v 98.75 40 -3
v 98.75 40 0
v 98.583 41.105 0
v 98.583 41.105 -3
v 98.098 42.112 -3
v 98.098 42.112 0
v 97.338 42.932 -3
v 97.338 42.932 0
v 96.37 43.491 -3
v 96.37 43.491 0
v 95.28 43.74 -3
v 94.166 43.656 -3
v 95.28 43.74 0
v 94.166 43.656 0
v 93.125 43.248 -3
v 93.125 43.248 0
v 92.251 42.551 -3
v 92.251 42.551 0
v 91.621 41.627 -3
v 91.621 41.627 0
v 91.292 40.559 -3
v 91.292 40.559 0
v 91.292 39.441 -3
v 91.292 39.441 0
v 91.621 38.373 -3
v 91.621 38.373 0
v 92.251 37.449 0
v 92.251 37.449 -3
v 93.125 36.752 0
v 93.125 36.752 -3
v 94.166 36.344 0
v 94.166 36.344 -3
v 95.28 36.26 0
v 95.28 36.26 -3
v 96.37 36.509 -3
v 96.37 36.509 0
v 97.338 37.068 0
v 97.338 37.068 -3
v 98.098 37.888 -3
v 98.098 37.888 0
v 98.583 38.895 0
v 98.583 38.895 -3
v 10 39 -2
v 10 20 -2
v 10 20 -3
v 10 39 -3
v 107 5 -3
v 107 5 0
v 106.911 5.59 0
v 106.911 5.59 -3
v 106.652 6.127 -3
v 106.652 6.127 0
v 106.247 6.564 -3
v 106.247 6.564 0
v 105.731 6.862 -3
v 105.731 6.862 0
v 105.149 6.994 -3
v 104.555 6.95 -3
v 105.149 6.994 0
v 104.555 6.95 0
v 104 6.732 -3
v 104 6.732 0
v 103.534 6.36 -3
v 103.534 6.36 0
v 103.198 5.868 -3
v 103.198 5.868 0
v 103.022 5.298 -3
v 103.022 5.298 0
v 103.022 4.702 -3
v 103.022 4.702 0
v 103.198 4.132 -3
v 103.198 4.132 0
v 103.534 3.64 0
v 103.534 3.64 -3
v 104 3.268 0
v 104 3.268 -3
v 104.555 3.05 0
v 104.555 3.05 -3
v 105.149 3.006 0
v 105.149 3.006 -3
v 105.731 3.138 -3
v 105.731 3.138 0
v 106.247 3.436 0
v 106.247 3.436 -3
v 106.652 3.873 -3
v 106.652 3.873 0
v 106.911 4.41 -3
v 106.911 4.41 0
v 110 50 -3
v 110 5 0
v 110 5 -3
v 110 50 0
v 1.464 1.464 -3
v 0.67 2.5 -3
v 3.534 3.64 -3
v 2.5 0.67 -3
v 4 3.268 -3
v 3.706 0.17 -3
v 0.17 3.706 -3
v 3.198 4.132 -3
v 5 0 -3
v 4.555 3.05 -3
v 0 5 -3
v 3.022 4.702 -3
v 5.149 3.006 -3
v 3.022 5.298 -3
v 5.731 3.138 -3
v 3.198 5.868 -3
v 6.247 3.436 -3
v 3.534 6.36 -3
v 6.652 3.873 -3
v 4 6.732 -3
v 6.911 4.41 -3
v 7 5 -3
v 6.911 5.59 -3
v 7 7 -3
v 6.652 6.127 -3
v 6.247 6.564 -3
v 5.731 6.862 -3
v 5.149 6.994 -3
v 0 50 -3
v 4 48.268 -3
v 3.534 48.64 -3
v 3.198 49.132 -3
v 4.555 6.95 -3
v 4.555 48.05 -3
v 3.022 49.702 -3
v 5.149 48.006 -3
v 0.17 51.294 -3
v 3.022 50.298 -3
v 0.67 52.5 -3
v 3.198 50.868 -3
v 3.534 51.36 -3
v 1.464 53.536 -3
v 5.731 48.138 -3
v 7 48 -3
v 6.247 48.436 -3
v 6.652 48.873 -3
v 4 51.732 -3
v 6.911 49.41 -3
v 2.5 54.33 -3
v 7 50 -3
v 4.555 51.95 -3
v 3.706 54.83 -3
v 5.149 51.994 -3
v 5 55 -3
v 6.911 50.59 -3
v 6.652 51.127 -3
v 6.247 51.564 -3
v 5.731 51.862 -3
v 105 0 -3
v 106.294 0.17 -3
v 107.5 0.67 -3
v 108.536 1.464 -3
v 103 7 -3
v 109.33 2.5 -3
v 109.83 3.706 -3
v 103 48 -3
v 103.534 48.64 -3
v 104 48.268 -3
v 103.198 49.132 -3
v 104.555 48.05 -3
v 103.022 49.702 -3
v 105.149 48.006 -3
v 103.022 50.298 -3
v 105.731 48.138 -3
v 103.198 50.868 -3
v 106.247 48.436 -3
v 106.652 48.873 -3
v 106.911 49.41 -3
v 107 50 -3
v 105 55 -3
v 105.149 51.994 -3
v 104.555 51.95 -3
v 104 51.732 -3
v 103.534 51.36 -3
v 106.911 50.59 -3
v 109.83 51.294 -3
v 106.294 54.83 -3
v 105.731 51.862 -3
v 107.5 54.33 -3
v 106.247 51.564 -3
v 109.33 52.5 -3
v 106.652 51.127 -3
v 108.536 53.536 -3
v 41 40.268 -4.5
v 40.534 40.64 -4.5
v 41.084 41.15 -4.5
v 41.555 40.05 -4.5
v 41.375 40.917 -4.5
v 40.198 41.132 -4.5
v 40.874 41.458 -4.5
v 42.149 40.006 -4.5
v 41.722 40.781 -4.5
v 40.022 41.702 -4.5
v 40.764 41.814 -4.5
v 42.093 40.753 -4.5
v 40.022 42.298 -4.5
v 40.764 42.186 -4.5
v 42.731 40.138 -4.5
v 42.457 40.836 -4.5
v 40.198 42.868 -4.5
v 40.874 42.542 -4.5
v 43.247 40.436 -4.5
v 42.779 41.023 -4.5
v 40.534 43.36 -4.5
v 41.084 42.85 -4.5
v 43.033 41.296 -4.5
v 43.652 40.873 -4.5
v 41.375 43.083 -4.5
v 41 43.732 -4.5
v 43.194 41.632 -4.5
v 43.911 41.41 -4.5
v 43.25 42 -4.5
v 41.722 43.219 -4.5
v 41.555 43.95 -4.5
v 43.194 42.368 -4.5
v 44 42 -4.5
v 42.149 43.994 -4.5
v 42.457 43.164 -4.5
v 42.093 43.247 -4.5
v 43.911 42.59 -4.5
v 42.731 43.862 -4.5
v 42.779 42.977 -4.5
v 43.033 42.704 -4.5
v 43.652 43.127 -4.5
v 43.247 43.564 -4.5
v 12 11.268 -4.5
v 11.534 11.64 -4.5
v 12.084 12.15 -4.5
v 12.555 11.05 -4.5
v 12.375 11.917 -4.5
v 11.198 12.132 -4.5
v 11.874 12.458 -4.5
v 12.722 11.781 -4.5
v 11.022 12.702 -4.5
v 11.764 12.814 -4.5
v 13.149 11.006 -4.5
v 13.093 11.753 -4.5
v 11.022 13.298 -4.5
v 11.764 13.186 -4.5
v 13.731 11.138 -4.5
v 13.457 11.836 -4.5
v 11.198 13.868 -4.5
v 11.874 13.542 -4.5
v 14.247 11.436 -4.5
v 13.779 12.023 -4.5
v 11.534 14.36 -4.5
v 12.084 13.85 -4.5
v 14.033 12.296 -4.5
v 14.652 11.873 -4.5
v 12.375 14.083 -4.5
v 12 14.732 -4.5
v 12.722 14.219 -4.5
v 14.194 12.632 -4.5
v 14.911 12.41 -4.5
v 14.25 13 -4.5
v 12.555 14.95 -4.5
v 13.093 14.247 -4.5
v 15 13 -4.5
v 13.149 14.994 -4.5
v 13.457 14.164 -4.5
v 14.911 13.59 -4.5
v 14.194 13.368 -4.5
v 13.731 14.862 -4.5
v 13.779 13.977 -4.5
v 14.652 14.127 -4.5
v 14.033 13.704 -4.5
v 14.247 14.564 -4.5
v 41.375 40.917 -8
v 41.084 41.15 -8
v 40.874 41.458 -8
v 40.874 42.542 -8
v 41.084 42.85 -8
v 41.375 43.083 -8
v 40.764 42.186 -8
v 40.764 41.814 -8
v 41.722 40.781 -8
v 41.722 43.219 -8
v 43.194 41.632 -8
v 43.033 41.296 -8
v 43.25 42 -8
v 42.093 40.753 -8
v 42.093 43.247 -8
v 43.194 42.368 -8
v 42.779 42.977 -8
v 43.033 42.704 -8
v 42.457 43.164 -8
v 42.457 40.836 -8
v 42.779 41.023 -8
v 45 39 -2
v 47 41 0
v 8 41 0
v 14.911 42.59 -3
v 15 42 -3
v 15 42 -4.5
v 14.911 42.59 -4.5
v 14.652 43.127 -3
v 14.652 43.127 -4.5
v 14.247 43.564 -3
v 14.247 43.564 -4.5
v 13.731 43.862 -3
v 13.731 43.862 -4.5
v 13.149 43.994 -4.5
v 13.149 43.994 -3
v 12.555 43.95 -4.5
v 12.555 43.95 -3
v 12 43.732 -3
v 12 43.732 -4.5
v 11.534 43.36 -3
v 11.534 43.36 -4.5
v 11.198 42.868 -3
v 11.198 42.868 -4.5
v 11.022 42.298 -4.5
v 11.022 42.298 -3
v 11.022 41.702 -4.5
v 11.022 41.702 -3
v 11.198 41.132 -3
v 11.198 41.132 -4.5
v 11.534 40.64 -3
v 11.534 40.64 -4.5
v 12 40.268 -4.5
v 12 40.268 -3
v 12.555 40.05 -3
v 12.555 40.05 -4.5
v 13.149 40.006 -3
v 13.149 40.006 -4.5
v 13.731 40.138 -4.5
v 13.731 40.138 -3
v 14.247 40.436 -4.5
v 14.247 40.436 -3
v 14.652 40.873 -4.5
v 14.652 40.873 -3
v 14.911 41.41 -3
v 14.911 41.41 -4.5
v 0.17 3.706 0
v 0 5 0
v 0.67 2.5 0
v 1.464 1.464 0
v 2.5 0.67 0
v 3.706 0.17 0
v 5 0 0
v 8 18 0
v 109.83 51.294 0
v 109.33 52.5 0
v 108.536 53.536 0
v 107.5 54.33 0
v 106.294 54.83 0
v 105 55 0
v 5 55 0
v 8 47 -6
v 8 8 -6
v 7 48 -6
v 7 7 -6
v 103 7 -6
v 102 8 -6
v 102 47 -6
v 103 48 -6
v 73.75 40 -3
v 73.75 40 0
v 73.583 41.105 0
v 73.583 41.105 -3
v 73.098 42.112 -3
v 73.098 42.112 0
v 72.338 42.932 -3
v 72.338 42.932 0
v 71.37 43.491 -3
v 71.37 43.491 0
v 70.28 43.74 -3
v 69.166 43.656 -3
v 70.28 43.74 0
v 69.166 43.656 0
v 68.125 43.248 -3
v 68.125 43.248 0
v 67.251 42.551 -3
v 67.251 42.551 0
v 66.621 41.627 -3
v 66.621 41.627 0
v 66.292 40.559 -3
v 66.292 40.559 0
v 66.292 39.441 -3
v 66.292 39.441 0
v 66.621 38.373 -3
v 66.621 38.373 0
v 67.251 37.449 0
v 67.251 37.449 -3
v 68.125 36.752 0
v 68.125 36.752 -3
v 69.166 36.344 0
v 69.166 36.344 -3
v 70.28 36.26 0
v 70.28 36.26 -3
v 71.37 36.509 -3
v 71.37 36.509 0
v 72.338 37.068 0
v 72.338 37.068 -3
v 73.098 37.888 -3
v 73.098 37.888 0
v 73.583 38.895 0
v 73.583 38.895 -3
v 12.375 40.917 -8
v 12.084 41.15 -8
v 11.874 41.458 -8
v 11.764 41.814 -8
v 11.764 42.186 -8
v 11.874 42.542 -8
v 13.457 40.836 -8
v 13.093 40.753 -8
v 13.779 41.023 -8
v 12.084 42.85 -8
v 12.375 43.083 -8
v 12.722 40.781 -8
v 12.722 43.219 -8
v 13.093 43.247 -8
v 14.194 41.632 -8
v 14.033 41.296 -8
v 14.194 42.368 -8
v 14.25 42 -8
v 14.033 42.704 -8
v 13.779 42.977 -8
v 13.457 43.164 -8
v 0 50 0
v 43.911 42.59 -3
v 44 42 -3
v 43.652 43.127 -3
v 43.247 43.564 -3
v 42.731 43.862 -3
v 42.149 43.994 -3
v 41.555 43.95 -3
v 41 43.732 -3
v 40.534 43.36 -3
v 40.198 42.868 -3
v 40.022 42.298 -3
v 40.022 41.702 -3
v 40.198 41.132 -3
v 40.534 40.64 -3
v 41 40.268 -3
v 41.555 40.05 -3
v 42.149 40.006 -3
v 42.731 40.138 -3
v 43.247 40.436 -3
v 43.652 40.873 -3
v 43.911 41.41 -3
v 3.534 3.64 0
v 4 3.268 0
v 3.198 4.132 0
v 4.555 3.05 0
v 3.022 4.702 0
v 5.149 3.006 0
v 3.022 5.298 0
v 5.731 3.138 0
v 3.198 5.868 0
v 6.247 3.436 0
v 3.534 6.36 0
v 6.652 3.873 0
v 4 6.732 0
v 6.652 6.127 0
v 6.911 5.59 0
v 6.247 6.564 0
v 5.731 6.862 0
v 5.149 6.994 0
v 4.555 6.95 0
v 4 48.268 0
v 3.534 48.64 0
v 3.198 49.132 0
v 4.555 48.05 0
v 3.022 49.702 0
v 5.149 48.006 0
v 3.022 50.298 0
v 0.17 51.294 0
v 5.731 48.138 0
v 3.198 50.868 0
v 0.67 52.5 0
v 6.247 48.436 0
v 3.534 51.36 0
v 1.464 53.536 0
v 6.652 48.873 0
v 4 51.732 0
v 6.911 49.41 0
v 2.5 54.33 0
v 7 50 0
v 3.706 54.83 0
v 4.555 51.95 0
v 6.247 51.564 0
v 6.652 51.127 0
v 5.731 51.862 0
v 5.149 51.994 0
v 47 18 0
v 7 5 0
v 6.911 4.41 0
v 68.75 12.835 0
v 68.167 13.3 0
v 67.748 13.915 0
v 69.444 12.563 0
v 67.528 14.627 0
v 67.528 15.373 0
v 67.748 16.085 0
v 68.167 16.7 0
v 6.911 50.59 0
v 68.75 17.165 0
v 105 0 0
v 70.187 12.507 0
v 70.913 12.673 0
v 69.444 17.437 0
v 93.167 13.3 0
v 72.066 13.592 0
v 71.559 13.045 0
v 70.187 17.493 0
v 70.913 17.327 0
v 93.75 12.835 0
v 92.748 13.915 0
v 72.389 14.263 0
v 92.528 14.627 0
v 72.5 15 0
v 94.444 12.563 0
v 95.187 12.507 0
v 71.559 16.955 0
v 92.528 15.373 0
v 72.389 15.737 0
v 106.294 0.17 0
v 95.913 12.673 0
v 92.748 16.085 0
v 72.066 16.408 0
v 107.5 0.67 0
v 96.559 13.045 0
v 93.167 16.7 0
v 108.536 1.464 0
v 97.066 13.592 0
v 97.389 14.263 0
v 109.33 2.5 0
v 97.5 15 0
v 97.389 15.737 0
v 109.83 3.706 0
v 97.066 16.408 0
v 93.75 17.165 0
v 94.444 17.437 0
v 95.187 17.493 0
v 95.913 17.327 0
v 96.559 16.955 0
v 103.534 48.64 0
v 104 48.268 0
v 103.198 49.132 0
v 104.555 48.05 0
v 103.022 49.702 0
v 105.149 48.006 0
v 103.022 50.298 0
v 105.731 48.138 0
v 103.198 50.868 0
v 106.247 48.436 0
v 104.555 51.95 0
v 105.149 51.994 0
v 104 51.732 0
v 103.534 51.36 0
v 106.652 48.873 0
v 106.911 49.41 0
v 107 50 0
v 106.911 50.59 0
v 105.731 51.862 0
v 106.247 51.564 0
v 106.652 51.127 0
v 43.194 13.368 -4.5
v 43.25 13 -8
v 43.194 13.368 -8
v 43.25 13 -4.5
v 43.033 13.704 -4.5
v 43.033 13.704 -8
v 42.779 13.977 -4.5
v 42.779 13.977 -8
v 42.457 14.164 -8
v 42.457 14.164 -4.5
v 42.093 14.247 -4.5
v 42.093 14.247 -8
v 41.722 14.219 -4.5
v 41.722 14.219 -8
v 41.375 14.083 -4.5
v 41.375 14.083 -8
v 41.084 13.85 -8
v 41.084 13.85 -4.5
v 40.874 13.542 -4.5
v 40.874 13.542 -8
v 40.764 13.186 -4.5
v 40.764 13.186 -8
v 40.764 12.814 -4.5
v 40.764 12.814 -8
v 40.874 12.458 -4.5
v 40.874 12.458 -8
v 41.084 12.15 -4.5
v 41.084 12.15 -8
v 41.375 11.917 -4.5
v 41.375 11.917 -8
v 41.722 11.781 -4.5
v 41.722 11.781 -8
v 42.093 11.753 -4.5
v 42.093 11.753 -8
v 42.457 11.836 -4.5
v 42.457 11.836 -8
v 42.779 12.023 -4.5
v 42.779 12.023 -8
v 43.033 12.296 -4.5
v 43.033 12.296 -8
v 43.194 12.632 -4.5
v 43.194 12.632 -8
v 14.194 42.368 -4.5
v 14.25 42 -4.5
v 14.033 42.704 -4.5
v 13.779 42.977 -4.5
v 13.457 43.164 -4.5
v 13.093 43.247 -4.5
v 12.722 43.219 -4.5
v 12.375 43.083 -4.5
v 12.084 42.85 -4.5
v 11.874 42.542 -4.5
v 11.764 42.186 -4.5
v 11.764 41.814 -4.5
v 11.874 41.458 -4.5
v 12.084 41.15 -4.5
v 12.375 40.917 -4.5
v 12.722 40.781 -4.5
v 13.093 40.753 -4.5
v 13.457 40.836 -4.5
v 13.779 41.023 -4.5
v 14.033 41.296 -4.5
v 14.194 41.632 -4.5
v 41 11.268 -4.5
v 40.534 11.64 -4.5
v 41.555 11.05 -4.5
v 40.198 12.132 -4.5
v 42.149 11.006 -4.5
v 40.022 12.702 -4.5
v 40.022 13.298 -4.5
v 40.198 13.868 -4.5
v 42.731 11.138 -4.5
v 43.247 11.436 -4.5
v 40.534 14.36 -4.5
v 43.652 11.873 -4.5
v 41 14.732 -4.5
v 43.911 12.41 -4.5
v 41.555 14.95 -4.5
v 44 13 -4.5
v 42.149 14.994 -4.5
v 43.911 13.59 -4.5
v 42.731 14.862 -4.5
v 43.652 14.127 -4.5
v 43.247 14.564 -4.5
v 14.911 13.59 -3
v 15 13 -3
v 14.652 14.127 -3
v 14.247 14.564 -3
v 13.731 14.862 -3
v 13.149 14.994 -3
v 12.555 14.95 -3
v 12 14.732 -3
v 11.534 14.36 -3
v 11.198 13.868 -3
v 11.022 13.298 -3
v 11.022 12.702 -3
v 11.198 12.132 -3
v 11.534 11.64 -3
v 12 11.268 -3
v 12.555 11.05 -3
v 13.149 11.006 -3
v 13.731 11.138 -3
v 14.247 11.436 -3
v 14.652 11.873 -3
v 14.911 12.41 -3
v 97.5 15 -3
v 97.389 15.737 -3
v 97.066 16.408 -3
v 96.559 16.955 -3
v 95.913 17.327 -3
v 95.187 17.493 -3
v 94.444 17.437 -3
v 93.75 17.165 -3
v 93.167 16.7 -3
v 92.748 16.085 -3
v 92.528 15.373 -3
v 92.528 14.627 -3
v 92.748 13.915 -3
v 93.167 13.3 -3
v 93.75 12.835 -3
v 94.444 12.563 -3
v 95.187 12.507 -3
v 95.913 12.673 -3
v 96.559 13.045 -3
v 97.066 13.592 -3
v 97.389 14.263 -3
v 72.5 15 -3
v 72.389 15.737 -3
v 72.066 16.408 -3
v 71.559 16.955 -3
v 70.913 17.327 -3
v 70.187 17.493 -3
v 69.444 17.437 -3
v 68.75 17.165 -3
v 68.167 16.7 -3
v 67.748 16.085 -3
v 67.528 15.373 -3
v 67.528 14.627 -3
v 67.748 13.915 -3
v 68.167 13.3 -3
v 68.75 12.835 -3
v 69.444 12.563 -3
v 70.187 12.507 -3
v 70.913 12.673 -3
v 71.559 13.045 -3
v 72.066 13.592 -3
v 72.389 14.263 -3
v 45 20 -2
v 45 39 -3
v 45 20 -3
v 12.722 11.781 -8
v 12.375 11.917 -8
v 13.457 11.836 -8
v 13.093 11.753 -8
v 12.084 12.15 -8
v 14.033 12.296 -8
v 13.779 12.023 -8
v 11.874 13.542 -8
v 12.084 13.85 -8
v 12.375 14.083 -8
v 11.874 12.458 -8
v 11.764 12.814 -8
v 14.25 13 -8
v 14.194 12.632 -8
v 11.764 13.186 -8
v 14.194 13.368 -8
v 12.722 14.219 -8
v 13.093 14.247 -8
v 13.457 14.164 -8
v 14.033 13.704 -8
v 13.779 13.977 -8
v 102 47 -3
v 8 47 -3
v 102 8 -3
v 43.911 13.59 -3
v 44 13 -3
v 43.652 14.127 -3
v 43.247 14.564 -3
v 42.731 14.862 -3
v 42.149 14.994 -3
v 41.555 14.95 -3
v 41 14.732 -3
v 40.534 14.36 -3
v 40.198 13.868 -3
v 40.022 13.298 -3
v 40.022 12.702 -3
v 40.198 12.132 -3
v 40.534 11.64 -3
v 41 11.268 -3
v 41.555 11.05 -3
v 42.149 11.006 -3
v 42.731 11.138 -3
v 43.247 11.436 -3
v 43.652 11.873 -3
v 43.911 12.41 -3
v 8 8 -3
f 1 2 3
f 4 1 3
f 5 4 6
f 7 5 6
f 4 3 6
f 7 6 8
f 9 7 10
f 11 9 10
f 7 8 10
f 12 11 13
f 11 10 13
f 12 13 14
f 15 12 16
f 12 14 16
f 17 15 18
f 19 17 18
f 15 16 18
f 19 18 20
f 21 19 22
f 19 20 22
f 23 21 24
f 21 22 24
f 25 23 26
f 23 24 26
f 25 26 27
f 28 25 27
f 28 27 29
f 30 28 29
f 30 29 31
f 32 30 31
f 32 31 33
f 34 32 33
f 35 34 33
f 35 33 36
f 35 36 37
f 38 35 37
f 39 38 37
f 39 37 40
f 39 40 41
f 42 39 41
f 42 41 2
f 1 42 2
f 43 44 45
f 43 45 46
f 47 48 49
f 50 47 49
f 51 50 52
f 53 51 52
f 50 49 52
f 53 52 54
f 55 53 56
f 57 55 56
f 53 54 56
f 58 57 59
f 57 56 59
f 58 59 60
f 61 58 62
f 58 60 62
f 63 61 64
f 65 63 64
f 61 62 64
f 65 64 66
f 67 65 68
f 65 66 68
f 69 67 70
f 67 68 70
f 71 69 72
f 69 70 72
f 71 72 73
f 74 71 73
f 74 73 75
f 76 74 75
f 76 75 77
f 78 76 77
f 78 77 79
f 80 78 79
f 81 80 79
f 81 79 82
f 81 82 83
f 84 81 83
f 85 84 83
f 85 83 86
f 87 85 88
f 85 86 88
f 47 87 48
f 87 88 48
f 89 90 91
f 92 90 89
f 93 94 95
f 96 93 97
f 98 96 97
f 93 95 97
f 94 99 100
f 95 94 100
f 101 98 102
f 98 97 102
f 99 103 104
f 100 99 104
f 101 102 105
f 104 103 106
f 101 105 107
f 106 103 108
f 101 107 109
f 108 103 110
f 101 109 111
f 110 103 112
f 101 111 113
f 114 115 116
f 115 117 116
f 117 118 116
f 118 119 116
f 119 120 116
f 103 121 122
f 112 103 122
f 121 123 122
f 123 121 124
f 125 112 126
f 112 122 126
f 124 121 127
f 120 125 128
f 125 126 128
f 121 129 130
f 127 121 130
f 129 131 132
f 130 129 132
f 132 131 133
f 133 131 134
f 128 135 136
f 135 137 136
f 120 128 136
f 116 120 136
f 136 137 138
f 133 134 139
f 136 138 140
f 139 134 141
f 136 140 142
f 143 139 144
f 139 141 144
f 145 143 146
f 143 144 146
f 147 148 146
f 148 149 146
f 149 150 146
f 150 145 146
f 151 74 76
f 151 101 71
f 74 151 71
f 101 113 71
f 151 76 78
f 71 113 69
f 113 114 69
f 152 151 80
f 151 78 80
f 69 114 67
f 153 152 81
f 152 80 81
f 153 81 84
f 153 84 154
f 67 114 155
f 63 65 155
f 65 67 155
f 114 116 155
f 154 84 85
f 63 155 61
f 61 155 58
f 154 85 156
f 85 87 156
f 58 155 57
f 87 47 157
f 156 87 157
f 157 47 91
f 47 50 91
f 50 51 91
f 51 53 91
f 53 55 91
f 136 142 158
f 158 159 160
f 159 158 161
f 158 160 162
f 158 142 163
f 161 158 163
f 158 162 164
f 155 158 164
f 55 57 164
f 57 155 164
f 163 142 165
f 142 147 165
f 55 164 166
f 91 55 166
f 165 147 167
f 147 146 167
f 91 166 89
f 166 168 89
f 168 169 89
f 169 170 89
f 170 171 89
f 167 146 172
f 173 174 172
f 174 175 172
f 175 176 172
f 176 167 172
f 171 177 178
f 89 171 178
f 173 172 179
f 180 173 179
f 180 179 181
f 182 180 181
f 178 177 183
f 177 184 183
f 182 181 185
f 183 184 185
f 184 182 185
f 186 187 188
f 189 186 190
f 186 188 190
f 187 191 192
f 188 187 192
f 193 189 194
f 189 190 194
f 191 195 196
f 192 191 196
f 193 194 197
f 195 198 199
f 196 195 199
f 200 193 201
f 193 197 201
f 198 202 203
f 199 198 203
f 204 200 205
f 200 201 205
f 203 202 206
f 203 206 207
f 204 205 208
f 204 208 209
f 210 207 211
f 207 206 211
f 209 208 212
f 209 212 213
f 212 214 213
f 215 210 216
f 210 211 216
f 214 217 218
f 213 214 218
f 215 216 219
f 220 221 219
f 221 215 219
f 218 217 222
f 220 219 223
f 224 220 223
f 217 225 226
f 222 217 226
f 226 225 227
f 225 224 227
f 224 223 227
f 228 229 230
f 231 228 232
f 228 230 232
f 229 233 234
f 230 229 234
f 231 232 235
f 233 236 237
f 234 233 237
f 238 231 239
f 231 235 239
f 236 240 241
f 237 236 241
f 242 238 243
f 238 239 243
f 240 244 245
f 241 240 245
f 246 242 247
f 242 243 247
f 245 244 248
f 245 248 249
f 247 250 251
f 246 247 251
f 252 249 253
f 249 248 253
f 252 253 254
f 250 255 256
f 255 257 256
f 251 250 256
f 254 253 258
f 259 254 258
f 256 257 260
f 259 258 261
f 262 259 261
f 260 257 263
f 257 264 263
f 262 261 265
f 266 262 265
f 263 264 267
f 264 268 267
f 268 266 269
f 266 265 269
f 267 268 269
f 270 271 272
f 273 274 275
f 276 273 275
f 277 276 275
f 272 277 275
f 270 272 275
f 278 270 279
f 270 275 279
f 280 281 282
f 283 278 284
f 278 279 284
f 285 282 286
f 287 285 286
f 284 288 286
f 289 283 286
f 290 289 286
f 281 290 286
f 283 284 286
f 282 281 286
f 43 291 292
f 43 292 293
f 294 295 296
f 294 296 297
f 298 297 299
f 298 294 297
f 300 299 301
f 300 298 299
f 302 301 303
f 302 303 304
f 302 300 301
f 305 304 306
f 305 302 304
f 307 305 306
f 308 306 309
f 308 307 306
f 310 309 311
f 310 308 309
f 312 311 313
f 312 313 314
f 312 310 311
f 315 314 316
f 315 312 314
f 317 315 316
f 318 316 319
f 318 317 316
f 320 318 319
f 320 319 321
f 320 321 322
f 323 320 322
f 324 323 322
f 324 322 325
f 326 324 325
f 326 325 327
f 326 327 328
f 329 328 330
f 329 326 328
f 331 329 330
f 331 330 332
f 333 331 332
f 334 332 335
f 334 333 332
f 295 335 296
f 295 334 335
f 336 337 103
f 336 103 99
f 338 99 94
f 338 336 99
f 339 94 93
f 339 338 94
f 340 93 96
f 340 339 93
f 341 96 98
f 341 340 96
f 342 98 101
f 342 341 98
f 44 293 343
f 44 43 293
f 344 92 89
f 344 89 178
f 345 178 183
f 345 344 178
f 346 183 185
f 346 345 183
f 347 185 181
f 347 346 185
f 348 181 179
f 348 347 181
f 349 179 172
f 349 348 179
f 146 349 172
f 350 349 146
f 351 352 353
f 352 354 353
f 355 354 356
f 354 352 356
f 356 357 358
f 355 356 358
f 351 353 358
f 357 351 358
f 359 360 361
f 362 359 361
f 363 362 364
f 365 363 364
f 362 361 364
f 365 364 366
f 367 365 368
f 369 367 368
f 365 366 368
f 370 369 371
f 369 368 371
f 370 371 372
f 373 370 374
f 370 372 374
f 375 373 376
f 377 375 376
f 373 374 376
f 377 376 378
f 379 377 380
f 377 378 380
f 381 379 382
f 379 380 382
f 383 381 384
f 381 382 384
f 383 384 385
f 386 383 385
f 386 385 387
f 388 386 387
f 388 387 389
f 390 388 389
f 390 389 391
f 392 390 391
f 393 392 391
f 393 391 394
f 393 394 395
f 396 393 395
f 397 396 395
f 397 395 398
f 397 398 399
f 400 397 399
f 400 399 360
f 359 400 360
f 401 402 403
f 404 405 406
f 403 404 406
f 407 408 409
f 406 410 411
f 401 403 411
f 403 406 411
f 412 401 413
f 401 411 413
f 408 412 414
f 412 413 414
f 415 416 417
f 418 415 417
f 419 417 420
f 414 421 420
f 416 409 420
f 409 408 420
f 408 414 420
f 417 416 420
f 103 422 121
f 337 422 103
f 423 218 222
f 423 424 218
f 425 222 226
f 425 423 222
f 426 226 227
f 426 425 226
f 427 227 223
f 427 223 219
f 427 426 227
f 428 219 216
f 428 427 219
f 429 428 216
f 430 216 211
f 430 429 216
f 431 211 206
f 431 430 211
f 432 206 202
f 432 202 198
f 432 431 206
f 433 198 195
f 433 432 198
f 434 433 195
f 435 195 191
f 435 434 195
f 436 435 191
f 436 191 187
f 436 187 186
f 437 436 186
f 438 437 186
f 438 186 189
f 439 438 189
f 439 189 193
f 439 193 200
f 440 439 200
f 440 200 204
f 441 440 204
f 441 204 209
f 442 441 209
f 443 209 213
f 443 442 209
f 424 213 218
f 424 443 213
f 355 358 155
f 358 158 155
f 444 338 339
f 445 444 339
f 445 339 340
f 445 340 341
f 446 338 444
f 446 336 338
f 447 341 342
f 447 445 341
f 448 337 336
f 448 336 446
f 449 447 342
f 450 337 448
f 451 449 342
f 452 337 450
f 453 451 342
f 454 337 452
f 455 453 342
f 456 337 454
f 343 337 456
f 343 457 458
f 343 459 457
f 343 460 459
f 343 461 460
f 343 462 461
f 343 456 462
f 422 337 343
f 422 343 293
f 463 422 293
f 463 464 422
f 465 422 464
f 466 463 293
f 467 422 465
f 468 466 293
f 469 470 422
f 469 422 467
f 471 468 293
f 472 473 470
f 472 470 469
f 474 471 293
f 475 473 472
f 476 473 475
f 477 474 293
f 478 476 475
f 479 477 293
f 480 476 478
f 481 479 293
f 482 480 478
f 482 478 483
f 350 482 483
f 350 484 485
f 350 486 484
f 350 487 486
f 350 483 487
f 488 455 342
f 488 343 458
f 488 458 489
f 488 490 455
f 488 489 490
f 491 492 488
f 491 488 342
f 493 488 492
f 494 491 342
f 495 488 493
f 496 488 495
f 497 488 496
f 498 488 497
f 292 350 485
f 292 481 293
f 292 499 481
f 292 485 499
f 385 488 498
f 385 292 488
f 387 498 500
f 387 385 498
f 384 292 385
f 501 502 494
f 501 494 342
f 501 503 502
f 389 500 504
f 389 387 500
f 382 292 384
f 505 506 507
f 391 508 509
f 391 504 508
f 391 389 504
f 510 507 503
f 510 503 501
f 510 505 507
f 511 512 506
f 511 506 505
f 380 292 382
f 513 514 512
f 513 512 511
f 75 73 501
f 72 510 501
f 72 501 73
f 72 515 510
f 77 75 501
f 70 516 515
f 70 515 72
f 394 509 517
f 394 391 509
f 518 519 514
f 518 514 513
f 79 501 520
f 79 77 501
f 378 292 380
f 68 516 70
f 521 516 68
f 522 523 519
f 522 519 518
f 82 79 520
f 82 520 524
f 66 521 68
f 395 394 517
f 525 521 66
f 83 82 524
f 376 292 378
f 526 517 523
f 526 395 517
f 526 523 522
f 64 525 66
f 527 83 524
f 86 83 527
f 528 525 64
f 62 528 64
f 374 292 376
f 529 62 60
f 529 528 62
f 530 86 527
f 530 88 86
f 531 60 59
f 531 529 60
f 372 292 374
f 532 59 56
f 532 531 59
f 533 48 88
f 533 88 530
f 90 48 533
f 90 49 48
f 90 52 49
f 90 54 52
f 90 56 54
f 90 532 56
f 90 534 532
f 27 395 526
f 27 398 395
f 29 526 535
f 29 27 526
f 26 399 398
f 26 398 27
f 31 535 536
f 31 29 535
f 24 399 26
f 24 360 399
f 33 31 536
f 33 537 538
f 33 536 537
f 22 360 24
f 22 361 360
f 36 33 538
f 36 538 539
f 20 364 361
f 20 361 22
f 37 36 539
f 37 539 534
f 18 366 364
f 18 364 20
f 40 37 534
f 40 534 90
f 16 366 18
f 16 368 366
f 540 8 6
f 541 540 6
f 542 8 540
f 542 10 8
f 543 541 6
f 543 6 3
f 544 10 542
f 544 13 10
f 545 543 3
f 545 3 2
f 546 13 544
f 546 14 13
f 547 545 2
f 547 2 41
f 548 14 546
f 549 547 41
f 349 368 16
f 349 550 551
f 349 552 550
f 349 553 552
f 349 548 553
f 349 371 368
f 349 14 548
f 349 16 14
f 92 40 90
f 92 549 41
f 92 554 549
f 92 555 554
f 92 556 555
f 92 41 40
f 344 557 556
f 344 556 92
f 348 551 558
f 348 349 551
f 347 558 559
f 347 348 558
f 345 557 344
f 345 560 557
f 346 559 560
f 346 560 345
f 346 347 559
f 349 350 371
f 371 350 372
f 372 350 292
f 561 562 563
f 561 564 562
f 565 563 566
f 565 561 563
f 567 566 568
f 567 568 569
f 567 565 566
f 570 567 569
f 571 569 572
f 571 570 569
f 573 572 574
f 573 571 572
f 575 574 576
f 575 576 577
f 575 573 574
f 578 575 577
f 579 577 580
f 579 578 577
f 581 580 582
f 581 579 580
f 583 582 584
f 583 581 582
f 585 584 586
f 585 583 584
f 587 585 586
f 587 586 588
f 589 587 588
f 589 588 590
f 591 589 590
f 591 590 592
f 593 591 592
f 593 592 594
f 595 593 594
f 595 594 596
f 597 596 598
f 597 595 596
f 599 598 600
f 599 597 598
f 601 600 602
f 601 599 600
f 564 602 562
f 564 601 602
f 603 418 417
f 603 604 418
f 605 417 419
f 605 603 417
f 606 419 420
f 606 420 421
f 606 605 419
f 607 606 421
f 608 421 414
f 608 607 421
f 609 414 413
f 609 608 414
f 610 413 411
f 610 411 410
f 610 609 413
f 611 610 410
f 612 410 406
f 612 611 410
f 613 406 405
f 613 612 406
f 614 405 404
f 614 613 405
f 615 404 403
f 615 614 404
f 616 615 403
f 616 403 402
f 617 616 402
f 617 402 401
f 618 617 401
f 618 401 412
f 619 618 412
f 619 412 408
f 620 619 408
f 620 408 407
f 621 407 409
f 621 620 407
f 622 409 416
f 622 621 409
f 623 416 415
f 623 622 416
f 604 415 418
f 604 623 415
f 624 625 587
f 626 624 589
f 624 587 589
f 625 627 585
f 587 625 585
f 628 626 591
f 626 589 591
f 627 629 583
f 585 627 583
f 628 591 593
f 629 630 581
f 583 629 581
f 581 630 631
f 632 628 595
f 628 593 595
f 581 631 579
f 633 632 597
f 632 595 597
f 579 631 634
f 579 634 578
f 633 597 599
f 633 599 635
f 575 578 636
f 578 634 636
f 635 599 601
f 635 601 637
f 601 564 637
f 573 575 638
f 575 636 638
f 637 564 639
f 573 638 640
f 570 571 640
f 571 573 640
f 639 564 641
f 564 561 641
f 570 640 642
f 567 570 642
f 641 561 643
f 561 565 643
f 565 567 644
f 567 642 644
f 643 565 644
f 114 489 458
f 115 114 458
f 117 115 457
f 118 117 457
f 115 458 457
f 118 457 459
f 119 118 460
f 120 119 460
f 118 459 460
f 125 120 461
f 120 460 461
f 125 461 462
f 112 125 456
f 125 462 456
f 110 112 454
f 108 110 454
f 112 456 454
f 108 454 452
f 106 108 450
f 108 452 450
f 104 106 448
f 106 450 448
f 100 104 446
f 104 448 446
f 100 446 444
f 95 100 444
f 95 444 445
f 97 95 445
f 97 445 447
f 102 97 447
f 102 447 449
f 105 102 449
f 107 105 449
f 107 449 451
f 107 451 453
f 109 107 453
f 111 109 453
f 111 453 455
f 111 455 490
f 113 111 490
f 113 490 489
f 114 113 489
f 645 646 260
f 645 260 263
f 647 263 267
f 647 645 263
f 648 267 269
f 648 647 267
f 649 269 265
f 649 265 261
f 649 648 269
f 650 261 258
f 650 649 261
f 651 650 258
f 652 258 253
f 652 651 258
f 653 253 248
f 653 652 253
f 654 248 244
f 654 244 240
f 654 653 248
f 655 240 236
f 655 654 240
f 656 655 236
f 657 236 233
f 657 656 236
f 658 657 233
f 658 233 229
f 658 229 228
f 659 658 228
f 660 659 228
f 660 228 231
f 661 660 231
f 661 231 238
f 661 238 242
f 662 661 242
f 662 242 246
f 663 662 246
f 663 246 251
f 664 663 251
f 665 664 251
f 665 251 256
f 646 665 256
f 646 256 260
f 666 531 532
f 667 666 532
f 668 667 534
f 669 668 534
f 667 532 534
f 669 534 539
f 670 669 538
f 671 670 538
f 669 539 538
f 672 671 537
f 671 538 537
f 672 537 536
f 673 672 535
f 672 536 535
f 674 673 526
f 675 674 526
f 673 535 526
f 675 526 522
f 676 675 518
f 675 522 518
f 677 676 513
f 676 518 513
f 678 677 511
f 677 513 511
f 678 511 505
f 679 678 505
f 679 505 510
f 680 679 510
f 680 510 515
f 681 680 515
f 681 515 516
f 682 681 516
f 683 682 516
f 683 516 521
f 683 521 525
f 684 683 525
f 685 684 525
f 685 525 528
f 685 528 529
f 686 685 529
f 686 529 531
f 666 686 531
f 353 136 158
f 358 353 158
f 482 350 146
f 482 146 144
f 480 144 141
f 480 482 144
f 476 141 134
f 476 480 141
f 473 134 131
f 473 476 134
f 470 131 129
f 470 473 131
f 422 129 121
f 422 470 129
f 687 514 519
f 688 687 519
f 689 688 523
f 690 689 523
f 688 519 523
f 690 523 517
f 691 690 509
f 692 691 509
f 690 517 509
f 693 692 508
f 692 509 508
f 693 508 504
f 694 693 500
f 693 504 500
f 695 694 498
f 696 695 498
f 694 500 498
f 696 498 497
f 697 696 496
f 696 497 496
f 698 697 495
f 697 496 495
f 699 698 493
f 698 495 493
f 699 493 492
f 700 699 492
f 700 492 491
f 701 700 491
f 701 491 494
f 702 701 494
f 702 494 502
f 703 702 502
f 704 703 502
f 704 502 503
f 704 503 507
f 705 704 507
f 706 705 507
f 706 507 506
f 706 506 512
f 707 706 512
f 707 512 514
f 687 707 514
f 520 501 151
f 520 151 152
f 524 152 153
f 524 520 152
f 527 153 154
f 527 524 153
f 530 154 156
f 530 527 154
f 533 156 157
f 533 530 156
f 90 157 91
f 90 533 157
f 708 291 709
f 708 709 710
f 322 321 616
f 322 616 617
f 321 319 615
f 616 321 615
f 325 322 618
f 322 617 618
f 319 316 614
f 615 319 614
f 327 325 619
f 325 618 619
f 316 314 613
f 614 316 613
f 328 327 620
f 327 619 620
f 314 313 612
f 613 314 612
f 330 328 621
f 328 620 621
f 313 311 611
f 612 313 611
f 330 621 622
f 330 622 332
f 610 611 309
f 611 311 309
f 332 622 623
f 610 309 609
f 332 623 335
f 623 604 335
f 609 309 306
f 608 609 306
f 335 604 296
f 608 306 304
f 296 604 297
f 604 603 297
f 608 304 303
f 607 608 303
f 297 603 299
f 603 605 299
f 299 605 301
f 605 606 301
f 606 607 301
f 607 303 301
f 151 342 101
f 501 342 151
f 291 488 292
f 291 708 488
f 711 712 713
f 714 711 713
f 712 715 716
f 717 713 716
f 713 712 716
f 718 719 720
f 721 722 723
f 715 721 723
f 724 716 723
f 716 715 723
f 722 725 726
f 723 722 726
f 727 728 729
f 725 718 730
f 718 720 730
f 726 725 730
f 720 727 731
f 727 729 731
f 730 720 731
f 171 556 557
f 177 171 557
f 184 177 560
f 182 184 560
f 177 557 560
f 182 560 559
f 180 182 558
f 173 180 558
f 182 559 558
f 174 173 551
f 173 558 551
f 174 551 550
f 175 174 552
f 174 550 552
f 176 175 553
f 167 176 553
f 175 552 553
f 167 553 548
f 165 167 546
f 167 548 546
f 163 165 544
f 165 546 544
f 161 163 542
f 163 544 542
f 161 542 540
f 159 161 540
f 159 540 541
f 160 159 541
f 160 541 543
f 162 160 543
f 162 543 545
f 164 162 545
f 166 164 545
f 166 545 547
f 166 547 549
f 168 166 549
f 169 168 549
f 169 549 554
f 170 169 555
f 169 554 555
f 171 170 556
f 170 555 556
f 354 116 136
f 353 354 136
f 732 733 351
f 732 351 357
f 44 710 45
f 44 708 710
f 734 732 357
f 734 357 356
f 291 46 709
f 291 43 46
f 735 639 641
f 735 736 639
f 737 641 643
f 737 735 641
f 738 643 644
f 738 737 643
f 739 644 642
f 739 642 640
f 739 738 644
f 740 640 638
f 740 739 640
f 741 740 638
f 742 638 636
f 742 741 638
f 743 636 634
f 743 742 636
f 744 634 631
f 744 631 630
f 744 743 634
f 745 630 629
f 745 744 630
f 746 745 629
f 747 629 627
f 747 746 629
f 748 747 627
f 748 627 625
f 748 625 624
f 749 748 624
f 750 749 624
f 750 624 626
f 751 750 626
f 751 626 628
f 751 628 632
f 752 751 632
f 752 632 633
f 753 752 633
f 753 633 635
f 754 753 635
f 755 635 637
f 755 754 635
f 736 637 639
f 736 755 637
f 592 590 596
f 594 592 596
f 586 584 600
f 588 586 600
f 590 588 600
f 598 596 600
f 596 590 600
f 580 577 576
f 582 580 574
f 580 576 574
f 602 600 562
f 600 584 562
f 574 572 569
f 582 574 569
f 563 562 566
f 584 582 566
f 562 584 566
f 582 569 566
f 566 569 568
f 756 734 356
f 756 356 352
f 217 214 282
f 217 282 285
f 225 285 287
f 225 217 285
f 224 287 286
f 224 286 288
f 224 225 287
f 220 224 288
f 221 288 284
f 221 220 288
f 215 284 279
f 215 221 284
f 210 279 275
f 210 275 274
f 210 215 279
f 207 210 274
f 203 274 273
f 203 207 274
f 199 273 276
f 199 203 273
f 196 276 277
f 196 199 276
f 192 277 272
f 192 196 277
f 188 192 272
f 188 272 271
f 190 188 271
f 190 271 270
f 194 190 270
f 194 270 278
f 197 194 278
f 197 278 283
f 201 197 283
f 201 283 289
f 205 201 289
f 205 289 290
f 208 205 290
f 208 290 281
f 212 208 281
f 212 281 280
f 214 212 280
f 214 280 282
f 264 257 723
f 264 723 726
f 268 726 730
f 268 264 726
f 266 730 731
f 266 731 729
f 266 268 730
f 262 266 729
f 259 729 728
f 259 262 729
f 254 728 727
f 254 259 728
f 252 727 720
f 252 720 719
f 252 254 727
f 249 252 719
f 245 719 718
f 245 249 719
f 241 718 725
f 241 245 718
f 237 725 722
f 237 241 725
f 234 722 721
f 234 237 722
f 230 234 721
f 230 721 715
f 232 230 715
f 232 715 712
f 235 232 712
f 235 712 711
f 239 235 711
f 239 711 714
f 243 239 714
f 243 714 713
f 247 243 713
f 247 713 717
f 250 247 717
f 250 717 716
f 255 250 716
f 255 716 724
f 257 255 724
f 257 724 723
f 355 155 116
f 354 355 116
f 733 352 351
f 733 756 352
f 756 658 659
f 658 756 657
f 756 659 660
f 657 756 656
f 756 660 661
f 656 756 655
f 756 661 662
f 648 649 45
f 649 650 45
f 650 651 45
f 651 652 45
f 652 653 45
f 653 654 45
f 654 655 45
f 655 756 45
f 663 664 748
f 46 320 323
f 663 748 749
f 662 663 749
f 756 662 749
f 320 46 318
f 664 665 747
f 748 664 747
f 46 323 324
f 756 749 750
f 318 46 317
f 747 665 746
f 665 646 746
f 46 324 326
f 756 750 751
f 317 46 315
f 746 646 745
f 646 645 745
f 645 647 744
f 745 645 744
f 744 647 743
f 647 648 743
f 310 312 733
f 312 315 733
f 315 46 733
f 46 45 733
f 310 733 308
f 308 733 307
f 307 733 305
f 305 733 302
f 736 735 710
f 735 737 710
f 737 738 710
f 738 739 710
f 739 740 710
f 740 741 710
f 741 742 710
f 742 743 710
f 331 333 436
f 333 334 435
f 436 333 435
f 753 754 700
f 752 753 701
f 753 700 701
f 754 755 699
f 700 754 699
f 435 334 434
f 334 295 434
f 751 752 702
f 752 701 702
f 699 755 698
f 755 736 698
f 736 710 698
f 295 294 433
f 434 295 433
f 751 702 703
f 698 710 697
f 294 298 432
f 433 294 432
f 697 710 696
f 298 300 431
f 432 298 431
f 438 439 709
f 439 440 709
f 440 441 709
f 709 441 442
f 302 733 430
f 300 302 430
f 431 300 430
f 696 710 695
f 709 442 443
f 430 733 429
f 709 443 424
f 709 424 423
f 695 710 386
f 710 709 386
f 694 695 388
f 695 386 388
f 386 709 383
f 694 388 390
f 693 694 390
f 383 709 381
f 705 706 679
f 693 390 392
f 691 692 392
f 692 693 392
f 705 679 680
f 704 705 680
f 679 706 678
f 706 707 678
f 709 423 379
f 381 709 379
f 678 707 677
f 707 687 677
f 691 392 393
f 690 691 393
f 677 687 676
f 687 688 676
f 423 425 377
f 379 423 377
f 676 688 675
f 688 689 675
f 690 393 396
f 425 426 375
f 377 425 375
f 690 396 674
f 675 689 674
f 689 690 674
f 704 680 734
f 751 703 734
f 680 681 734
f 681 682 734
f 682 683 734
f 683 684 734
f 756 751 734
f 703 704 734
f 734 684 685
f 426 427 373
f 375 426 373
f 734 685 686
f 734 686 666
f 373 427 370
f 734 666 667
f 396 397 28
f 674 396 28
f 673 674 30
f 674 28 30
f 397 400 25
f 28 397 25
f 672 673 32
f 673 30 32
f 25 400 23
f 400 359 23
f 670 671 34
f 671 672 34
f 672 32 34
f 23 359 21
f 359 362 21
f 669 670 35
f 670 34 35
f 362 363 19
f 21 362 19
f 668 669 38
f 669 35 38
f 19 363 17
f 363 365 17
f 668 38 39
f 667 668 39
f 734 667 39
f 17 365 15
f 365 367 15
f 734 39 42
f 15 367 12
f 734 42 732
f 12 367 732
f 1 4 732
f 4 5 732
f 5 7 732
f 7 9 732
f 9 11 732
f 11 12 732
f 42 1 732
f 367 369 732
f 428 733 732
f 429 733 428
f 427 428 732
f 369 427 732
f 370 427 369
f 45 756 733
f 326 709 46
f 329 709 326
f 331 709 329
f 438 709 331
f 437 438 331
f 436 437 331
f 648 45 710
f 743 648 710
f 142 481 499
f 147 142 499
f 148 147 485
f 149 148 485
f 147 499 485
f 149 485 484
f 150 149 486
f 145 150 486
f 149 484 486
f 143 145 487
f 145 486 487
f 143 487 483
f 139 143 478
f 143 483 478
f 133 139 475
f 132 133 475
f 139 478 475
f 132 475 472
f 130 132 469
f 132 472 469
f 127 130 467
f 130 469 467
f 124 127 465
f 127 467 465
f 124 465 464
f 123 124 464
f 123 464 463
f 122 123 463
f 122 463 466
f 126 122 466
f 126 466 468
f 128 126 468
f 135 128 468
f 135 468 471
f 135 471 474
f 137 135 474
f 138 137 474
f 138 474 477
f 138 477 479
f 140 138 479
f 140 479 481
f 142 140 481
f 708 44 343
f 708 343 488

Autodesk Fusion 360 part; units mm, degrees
sketch "Sketch2" plane through (0, 0, 0) normal (0, 0, 1) x (1, 0, 0)
  line L0 (5, 0) -> (105, 0)
  line L1 (110, 5) -> (110, 50)
  line L2 (105, 55) -> (5, 55)
  line L3 (0, 50) -> (0, 5)
  line L4 (10, 45) -> (45, 45)
  line L5 (45, 45) -> (45, 10)
  line L6 (45, 10) -> (10, 10)
  line L7 (10, 10) -> (10, 45)
  circle A0 centre (95, 40) radius 3.75
  circle A1 centre (70, 40) radius 3.75
  circle A2 centre (95, 15) radius 2.5
  circle A3 centre (70, 15) radius 2.5
  line L8 (10, 39) -> (45, 39)
  line L9 (45, 39) -> (45, 20)
  line L10 (45, 20) -> (10, 20)
  line L11 (10, 20) -> (10, 39)
  circle A4 centre (13, 42) radius 1.25
  circle A5 centre (42, 42) radius 1.25
  circle A6 centre (13, 13) radius 1.25
  circle A7 centre (42, 13) radius 1.25
  circle A8 centre (13, 42) radius 2
  circle A9 centre (42, 42) radius 2
  circle A10 centre (13, 13) radius 2
  circle A11 centre (42, 13) radius 2
  circle A12 centre (5, 50) radius 2
  circle A13 centre (105, 50) radius 2
  circle A14 centre (5, 5) radius 2
  circle A15 centre (105, 5) radius 2
  arc A16 (5, 55) -> (0, 50) centre (5, 50) ccw
  arc A17 (110, 50) -> (105, 55) centre (105, 50) ccw
  arc A18 (105, 0) -> (110, 5) centre (105, 5) ccw
  arc A19 (0, 5) -> (5, 0) centre (5, 5) ccw
  line L12 (8, 47) -> (102, 47)
  line L13 (102, 47) -> (102, 8)
  line L14 (102, 8) -> (8, 8)
  line L15 (8, 8) -> (8, 47)
  line L16 (7, 48) -> (103, 48)
  line L17 (103, 48) -> (103, 7)
  line L18 (103, 7) -> (7, 7)
  line L19 (7, 7) -> (7, 48)
  dimension "d3" = 7.5
  dimension "d4" = 20
  dimension "d5" = 10
  dimension "d6" = -25
  dimension "d7" = -25
  dimension "d8" = 5
  dimension "d9" = 20
  dimension "d10" = 10
  dimension "d11" = -25
  dimension "d12" = 0
  dimension "d13" = 2.5
  dimension "d14" = 20
  dimension "d15" = 20
  dimension "d16" = 29
  dimension "d17" = -29
  dimension "d18" = 4
  dimension "d19" = 20
  dimension "d20" = 20
  dimension "d21" = 29
  dimension "d22" = -29
  dimension "d23" = 4
  dimension "d24" = 20
  dimension "d25" = 20
  dimension "d26" = 100
  dimension "d27" = -45
  dimension "d28" = 5
extrude "Extrude1" add sketch "Sketch2" against normal blind 3 contours L0 L1 L2 L3 A16 A17 A18 A19 | L4 L5 L7 L8 | L5 L6 L7 L10 | L12 L13 L14 L15 makes body 1 at (71.066, 1.3774, 0) makes body 2 at (60.2764, 24.5895, 0)
extrude "Extrude2" add sketch "Sketch2" against normal blind 6 contours L16 L17 L18 L19 bodies 1 2
extrude "Extrude3" add sketch "Sketch2" against normal blind 4.5 contours A8 | A9 | A10 | A11 bodies 1
extrude "Extrude4" add sketch "Sketch2" against normal blind 8 contours A4 | A5 | A6 | A7 bodies 1
chamfer "Chamfer1" distance 2 angle 45 4 edges at (27.5, 20, 0) (27.5, 39, 0) (45, 29.5, 0) (10, 29.5, 0) on bodies 1
